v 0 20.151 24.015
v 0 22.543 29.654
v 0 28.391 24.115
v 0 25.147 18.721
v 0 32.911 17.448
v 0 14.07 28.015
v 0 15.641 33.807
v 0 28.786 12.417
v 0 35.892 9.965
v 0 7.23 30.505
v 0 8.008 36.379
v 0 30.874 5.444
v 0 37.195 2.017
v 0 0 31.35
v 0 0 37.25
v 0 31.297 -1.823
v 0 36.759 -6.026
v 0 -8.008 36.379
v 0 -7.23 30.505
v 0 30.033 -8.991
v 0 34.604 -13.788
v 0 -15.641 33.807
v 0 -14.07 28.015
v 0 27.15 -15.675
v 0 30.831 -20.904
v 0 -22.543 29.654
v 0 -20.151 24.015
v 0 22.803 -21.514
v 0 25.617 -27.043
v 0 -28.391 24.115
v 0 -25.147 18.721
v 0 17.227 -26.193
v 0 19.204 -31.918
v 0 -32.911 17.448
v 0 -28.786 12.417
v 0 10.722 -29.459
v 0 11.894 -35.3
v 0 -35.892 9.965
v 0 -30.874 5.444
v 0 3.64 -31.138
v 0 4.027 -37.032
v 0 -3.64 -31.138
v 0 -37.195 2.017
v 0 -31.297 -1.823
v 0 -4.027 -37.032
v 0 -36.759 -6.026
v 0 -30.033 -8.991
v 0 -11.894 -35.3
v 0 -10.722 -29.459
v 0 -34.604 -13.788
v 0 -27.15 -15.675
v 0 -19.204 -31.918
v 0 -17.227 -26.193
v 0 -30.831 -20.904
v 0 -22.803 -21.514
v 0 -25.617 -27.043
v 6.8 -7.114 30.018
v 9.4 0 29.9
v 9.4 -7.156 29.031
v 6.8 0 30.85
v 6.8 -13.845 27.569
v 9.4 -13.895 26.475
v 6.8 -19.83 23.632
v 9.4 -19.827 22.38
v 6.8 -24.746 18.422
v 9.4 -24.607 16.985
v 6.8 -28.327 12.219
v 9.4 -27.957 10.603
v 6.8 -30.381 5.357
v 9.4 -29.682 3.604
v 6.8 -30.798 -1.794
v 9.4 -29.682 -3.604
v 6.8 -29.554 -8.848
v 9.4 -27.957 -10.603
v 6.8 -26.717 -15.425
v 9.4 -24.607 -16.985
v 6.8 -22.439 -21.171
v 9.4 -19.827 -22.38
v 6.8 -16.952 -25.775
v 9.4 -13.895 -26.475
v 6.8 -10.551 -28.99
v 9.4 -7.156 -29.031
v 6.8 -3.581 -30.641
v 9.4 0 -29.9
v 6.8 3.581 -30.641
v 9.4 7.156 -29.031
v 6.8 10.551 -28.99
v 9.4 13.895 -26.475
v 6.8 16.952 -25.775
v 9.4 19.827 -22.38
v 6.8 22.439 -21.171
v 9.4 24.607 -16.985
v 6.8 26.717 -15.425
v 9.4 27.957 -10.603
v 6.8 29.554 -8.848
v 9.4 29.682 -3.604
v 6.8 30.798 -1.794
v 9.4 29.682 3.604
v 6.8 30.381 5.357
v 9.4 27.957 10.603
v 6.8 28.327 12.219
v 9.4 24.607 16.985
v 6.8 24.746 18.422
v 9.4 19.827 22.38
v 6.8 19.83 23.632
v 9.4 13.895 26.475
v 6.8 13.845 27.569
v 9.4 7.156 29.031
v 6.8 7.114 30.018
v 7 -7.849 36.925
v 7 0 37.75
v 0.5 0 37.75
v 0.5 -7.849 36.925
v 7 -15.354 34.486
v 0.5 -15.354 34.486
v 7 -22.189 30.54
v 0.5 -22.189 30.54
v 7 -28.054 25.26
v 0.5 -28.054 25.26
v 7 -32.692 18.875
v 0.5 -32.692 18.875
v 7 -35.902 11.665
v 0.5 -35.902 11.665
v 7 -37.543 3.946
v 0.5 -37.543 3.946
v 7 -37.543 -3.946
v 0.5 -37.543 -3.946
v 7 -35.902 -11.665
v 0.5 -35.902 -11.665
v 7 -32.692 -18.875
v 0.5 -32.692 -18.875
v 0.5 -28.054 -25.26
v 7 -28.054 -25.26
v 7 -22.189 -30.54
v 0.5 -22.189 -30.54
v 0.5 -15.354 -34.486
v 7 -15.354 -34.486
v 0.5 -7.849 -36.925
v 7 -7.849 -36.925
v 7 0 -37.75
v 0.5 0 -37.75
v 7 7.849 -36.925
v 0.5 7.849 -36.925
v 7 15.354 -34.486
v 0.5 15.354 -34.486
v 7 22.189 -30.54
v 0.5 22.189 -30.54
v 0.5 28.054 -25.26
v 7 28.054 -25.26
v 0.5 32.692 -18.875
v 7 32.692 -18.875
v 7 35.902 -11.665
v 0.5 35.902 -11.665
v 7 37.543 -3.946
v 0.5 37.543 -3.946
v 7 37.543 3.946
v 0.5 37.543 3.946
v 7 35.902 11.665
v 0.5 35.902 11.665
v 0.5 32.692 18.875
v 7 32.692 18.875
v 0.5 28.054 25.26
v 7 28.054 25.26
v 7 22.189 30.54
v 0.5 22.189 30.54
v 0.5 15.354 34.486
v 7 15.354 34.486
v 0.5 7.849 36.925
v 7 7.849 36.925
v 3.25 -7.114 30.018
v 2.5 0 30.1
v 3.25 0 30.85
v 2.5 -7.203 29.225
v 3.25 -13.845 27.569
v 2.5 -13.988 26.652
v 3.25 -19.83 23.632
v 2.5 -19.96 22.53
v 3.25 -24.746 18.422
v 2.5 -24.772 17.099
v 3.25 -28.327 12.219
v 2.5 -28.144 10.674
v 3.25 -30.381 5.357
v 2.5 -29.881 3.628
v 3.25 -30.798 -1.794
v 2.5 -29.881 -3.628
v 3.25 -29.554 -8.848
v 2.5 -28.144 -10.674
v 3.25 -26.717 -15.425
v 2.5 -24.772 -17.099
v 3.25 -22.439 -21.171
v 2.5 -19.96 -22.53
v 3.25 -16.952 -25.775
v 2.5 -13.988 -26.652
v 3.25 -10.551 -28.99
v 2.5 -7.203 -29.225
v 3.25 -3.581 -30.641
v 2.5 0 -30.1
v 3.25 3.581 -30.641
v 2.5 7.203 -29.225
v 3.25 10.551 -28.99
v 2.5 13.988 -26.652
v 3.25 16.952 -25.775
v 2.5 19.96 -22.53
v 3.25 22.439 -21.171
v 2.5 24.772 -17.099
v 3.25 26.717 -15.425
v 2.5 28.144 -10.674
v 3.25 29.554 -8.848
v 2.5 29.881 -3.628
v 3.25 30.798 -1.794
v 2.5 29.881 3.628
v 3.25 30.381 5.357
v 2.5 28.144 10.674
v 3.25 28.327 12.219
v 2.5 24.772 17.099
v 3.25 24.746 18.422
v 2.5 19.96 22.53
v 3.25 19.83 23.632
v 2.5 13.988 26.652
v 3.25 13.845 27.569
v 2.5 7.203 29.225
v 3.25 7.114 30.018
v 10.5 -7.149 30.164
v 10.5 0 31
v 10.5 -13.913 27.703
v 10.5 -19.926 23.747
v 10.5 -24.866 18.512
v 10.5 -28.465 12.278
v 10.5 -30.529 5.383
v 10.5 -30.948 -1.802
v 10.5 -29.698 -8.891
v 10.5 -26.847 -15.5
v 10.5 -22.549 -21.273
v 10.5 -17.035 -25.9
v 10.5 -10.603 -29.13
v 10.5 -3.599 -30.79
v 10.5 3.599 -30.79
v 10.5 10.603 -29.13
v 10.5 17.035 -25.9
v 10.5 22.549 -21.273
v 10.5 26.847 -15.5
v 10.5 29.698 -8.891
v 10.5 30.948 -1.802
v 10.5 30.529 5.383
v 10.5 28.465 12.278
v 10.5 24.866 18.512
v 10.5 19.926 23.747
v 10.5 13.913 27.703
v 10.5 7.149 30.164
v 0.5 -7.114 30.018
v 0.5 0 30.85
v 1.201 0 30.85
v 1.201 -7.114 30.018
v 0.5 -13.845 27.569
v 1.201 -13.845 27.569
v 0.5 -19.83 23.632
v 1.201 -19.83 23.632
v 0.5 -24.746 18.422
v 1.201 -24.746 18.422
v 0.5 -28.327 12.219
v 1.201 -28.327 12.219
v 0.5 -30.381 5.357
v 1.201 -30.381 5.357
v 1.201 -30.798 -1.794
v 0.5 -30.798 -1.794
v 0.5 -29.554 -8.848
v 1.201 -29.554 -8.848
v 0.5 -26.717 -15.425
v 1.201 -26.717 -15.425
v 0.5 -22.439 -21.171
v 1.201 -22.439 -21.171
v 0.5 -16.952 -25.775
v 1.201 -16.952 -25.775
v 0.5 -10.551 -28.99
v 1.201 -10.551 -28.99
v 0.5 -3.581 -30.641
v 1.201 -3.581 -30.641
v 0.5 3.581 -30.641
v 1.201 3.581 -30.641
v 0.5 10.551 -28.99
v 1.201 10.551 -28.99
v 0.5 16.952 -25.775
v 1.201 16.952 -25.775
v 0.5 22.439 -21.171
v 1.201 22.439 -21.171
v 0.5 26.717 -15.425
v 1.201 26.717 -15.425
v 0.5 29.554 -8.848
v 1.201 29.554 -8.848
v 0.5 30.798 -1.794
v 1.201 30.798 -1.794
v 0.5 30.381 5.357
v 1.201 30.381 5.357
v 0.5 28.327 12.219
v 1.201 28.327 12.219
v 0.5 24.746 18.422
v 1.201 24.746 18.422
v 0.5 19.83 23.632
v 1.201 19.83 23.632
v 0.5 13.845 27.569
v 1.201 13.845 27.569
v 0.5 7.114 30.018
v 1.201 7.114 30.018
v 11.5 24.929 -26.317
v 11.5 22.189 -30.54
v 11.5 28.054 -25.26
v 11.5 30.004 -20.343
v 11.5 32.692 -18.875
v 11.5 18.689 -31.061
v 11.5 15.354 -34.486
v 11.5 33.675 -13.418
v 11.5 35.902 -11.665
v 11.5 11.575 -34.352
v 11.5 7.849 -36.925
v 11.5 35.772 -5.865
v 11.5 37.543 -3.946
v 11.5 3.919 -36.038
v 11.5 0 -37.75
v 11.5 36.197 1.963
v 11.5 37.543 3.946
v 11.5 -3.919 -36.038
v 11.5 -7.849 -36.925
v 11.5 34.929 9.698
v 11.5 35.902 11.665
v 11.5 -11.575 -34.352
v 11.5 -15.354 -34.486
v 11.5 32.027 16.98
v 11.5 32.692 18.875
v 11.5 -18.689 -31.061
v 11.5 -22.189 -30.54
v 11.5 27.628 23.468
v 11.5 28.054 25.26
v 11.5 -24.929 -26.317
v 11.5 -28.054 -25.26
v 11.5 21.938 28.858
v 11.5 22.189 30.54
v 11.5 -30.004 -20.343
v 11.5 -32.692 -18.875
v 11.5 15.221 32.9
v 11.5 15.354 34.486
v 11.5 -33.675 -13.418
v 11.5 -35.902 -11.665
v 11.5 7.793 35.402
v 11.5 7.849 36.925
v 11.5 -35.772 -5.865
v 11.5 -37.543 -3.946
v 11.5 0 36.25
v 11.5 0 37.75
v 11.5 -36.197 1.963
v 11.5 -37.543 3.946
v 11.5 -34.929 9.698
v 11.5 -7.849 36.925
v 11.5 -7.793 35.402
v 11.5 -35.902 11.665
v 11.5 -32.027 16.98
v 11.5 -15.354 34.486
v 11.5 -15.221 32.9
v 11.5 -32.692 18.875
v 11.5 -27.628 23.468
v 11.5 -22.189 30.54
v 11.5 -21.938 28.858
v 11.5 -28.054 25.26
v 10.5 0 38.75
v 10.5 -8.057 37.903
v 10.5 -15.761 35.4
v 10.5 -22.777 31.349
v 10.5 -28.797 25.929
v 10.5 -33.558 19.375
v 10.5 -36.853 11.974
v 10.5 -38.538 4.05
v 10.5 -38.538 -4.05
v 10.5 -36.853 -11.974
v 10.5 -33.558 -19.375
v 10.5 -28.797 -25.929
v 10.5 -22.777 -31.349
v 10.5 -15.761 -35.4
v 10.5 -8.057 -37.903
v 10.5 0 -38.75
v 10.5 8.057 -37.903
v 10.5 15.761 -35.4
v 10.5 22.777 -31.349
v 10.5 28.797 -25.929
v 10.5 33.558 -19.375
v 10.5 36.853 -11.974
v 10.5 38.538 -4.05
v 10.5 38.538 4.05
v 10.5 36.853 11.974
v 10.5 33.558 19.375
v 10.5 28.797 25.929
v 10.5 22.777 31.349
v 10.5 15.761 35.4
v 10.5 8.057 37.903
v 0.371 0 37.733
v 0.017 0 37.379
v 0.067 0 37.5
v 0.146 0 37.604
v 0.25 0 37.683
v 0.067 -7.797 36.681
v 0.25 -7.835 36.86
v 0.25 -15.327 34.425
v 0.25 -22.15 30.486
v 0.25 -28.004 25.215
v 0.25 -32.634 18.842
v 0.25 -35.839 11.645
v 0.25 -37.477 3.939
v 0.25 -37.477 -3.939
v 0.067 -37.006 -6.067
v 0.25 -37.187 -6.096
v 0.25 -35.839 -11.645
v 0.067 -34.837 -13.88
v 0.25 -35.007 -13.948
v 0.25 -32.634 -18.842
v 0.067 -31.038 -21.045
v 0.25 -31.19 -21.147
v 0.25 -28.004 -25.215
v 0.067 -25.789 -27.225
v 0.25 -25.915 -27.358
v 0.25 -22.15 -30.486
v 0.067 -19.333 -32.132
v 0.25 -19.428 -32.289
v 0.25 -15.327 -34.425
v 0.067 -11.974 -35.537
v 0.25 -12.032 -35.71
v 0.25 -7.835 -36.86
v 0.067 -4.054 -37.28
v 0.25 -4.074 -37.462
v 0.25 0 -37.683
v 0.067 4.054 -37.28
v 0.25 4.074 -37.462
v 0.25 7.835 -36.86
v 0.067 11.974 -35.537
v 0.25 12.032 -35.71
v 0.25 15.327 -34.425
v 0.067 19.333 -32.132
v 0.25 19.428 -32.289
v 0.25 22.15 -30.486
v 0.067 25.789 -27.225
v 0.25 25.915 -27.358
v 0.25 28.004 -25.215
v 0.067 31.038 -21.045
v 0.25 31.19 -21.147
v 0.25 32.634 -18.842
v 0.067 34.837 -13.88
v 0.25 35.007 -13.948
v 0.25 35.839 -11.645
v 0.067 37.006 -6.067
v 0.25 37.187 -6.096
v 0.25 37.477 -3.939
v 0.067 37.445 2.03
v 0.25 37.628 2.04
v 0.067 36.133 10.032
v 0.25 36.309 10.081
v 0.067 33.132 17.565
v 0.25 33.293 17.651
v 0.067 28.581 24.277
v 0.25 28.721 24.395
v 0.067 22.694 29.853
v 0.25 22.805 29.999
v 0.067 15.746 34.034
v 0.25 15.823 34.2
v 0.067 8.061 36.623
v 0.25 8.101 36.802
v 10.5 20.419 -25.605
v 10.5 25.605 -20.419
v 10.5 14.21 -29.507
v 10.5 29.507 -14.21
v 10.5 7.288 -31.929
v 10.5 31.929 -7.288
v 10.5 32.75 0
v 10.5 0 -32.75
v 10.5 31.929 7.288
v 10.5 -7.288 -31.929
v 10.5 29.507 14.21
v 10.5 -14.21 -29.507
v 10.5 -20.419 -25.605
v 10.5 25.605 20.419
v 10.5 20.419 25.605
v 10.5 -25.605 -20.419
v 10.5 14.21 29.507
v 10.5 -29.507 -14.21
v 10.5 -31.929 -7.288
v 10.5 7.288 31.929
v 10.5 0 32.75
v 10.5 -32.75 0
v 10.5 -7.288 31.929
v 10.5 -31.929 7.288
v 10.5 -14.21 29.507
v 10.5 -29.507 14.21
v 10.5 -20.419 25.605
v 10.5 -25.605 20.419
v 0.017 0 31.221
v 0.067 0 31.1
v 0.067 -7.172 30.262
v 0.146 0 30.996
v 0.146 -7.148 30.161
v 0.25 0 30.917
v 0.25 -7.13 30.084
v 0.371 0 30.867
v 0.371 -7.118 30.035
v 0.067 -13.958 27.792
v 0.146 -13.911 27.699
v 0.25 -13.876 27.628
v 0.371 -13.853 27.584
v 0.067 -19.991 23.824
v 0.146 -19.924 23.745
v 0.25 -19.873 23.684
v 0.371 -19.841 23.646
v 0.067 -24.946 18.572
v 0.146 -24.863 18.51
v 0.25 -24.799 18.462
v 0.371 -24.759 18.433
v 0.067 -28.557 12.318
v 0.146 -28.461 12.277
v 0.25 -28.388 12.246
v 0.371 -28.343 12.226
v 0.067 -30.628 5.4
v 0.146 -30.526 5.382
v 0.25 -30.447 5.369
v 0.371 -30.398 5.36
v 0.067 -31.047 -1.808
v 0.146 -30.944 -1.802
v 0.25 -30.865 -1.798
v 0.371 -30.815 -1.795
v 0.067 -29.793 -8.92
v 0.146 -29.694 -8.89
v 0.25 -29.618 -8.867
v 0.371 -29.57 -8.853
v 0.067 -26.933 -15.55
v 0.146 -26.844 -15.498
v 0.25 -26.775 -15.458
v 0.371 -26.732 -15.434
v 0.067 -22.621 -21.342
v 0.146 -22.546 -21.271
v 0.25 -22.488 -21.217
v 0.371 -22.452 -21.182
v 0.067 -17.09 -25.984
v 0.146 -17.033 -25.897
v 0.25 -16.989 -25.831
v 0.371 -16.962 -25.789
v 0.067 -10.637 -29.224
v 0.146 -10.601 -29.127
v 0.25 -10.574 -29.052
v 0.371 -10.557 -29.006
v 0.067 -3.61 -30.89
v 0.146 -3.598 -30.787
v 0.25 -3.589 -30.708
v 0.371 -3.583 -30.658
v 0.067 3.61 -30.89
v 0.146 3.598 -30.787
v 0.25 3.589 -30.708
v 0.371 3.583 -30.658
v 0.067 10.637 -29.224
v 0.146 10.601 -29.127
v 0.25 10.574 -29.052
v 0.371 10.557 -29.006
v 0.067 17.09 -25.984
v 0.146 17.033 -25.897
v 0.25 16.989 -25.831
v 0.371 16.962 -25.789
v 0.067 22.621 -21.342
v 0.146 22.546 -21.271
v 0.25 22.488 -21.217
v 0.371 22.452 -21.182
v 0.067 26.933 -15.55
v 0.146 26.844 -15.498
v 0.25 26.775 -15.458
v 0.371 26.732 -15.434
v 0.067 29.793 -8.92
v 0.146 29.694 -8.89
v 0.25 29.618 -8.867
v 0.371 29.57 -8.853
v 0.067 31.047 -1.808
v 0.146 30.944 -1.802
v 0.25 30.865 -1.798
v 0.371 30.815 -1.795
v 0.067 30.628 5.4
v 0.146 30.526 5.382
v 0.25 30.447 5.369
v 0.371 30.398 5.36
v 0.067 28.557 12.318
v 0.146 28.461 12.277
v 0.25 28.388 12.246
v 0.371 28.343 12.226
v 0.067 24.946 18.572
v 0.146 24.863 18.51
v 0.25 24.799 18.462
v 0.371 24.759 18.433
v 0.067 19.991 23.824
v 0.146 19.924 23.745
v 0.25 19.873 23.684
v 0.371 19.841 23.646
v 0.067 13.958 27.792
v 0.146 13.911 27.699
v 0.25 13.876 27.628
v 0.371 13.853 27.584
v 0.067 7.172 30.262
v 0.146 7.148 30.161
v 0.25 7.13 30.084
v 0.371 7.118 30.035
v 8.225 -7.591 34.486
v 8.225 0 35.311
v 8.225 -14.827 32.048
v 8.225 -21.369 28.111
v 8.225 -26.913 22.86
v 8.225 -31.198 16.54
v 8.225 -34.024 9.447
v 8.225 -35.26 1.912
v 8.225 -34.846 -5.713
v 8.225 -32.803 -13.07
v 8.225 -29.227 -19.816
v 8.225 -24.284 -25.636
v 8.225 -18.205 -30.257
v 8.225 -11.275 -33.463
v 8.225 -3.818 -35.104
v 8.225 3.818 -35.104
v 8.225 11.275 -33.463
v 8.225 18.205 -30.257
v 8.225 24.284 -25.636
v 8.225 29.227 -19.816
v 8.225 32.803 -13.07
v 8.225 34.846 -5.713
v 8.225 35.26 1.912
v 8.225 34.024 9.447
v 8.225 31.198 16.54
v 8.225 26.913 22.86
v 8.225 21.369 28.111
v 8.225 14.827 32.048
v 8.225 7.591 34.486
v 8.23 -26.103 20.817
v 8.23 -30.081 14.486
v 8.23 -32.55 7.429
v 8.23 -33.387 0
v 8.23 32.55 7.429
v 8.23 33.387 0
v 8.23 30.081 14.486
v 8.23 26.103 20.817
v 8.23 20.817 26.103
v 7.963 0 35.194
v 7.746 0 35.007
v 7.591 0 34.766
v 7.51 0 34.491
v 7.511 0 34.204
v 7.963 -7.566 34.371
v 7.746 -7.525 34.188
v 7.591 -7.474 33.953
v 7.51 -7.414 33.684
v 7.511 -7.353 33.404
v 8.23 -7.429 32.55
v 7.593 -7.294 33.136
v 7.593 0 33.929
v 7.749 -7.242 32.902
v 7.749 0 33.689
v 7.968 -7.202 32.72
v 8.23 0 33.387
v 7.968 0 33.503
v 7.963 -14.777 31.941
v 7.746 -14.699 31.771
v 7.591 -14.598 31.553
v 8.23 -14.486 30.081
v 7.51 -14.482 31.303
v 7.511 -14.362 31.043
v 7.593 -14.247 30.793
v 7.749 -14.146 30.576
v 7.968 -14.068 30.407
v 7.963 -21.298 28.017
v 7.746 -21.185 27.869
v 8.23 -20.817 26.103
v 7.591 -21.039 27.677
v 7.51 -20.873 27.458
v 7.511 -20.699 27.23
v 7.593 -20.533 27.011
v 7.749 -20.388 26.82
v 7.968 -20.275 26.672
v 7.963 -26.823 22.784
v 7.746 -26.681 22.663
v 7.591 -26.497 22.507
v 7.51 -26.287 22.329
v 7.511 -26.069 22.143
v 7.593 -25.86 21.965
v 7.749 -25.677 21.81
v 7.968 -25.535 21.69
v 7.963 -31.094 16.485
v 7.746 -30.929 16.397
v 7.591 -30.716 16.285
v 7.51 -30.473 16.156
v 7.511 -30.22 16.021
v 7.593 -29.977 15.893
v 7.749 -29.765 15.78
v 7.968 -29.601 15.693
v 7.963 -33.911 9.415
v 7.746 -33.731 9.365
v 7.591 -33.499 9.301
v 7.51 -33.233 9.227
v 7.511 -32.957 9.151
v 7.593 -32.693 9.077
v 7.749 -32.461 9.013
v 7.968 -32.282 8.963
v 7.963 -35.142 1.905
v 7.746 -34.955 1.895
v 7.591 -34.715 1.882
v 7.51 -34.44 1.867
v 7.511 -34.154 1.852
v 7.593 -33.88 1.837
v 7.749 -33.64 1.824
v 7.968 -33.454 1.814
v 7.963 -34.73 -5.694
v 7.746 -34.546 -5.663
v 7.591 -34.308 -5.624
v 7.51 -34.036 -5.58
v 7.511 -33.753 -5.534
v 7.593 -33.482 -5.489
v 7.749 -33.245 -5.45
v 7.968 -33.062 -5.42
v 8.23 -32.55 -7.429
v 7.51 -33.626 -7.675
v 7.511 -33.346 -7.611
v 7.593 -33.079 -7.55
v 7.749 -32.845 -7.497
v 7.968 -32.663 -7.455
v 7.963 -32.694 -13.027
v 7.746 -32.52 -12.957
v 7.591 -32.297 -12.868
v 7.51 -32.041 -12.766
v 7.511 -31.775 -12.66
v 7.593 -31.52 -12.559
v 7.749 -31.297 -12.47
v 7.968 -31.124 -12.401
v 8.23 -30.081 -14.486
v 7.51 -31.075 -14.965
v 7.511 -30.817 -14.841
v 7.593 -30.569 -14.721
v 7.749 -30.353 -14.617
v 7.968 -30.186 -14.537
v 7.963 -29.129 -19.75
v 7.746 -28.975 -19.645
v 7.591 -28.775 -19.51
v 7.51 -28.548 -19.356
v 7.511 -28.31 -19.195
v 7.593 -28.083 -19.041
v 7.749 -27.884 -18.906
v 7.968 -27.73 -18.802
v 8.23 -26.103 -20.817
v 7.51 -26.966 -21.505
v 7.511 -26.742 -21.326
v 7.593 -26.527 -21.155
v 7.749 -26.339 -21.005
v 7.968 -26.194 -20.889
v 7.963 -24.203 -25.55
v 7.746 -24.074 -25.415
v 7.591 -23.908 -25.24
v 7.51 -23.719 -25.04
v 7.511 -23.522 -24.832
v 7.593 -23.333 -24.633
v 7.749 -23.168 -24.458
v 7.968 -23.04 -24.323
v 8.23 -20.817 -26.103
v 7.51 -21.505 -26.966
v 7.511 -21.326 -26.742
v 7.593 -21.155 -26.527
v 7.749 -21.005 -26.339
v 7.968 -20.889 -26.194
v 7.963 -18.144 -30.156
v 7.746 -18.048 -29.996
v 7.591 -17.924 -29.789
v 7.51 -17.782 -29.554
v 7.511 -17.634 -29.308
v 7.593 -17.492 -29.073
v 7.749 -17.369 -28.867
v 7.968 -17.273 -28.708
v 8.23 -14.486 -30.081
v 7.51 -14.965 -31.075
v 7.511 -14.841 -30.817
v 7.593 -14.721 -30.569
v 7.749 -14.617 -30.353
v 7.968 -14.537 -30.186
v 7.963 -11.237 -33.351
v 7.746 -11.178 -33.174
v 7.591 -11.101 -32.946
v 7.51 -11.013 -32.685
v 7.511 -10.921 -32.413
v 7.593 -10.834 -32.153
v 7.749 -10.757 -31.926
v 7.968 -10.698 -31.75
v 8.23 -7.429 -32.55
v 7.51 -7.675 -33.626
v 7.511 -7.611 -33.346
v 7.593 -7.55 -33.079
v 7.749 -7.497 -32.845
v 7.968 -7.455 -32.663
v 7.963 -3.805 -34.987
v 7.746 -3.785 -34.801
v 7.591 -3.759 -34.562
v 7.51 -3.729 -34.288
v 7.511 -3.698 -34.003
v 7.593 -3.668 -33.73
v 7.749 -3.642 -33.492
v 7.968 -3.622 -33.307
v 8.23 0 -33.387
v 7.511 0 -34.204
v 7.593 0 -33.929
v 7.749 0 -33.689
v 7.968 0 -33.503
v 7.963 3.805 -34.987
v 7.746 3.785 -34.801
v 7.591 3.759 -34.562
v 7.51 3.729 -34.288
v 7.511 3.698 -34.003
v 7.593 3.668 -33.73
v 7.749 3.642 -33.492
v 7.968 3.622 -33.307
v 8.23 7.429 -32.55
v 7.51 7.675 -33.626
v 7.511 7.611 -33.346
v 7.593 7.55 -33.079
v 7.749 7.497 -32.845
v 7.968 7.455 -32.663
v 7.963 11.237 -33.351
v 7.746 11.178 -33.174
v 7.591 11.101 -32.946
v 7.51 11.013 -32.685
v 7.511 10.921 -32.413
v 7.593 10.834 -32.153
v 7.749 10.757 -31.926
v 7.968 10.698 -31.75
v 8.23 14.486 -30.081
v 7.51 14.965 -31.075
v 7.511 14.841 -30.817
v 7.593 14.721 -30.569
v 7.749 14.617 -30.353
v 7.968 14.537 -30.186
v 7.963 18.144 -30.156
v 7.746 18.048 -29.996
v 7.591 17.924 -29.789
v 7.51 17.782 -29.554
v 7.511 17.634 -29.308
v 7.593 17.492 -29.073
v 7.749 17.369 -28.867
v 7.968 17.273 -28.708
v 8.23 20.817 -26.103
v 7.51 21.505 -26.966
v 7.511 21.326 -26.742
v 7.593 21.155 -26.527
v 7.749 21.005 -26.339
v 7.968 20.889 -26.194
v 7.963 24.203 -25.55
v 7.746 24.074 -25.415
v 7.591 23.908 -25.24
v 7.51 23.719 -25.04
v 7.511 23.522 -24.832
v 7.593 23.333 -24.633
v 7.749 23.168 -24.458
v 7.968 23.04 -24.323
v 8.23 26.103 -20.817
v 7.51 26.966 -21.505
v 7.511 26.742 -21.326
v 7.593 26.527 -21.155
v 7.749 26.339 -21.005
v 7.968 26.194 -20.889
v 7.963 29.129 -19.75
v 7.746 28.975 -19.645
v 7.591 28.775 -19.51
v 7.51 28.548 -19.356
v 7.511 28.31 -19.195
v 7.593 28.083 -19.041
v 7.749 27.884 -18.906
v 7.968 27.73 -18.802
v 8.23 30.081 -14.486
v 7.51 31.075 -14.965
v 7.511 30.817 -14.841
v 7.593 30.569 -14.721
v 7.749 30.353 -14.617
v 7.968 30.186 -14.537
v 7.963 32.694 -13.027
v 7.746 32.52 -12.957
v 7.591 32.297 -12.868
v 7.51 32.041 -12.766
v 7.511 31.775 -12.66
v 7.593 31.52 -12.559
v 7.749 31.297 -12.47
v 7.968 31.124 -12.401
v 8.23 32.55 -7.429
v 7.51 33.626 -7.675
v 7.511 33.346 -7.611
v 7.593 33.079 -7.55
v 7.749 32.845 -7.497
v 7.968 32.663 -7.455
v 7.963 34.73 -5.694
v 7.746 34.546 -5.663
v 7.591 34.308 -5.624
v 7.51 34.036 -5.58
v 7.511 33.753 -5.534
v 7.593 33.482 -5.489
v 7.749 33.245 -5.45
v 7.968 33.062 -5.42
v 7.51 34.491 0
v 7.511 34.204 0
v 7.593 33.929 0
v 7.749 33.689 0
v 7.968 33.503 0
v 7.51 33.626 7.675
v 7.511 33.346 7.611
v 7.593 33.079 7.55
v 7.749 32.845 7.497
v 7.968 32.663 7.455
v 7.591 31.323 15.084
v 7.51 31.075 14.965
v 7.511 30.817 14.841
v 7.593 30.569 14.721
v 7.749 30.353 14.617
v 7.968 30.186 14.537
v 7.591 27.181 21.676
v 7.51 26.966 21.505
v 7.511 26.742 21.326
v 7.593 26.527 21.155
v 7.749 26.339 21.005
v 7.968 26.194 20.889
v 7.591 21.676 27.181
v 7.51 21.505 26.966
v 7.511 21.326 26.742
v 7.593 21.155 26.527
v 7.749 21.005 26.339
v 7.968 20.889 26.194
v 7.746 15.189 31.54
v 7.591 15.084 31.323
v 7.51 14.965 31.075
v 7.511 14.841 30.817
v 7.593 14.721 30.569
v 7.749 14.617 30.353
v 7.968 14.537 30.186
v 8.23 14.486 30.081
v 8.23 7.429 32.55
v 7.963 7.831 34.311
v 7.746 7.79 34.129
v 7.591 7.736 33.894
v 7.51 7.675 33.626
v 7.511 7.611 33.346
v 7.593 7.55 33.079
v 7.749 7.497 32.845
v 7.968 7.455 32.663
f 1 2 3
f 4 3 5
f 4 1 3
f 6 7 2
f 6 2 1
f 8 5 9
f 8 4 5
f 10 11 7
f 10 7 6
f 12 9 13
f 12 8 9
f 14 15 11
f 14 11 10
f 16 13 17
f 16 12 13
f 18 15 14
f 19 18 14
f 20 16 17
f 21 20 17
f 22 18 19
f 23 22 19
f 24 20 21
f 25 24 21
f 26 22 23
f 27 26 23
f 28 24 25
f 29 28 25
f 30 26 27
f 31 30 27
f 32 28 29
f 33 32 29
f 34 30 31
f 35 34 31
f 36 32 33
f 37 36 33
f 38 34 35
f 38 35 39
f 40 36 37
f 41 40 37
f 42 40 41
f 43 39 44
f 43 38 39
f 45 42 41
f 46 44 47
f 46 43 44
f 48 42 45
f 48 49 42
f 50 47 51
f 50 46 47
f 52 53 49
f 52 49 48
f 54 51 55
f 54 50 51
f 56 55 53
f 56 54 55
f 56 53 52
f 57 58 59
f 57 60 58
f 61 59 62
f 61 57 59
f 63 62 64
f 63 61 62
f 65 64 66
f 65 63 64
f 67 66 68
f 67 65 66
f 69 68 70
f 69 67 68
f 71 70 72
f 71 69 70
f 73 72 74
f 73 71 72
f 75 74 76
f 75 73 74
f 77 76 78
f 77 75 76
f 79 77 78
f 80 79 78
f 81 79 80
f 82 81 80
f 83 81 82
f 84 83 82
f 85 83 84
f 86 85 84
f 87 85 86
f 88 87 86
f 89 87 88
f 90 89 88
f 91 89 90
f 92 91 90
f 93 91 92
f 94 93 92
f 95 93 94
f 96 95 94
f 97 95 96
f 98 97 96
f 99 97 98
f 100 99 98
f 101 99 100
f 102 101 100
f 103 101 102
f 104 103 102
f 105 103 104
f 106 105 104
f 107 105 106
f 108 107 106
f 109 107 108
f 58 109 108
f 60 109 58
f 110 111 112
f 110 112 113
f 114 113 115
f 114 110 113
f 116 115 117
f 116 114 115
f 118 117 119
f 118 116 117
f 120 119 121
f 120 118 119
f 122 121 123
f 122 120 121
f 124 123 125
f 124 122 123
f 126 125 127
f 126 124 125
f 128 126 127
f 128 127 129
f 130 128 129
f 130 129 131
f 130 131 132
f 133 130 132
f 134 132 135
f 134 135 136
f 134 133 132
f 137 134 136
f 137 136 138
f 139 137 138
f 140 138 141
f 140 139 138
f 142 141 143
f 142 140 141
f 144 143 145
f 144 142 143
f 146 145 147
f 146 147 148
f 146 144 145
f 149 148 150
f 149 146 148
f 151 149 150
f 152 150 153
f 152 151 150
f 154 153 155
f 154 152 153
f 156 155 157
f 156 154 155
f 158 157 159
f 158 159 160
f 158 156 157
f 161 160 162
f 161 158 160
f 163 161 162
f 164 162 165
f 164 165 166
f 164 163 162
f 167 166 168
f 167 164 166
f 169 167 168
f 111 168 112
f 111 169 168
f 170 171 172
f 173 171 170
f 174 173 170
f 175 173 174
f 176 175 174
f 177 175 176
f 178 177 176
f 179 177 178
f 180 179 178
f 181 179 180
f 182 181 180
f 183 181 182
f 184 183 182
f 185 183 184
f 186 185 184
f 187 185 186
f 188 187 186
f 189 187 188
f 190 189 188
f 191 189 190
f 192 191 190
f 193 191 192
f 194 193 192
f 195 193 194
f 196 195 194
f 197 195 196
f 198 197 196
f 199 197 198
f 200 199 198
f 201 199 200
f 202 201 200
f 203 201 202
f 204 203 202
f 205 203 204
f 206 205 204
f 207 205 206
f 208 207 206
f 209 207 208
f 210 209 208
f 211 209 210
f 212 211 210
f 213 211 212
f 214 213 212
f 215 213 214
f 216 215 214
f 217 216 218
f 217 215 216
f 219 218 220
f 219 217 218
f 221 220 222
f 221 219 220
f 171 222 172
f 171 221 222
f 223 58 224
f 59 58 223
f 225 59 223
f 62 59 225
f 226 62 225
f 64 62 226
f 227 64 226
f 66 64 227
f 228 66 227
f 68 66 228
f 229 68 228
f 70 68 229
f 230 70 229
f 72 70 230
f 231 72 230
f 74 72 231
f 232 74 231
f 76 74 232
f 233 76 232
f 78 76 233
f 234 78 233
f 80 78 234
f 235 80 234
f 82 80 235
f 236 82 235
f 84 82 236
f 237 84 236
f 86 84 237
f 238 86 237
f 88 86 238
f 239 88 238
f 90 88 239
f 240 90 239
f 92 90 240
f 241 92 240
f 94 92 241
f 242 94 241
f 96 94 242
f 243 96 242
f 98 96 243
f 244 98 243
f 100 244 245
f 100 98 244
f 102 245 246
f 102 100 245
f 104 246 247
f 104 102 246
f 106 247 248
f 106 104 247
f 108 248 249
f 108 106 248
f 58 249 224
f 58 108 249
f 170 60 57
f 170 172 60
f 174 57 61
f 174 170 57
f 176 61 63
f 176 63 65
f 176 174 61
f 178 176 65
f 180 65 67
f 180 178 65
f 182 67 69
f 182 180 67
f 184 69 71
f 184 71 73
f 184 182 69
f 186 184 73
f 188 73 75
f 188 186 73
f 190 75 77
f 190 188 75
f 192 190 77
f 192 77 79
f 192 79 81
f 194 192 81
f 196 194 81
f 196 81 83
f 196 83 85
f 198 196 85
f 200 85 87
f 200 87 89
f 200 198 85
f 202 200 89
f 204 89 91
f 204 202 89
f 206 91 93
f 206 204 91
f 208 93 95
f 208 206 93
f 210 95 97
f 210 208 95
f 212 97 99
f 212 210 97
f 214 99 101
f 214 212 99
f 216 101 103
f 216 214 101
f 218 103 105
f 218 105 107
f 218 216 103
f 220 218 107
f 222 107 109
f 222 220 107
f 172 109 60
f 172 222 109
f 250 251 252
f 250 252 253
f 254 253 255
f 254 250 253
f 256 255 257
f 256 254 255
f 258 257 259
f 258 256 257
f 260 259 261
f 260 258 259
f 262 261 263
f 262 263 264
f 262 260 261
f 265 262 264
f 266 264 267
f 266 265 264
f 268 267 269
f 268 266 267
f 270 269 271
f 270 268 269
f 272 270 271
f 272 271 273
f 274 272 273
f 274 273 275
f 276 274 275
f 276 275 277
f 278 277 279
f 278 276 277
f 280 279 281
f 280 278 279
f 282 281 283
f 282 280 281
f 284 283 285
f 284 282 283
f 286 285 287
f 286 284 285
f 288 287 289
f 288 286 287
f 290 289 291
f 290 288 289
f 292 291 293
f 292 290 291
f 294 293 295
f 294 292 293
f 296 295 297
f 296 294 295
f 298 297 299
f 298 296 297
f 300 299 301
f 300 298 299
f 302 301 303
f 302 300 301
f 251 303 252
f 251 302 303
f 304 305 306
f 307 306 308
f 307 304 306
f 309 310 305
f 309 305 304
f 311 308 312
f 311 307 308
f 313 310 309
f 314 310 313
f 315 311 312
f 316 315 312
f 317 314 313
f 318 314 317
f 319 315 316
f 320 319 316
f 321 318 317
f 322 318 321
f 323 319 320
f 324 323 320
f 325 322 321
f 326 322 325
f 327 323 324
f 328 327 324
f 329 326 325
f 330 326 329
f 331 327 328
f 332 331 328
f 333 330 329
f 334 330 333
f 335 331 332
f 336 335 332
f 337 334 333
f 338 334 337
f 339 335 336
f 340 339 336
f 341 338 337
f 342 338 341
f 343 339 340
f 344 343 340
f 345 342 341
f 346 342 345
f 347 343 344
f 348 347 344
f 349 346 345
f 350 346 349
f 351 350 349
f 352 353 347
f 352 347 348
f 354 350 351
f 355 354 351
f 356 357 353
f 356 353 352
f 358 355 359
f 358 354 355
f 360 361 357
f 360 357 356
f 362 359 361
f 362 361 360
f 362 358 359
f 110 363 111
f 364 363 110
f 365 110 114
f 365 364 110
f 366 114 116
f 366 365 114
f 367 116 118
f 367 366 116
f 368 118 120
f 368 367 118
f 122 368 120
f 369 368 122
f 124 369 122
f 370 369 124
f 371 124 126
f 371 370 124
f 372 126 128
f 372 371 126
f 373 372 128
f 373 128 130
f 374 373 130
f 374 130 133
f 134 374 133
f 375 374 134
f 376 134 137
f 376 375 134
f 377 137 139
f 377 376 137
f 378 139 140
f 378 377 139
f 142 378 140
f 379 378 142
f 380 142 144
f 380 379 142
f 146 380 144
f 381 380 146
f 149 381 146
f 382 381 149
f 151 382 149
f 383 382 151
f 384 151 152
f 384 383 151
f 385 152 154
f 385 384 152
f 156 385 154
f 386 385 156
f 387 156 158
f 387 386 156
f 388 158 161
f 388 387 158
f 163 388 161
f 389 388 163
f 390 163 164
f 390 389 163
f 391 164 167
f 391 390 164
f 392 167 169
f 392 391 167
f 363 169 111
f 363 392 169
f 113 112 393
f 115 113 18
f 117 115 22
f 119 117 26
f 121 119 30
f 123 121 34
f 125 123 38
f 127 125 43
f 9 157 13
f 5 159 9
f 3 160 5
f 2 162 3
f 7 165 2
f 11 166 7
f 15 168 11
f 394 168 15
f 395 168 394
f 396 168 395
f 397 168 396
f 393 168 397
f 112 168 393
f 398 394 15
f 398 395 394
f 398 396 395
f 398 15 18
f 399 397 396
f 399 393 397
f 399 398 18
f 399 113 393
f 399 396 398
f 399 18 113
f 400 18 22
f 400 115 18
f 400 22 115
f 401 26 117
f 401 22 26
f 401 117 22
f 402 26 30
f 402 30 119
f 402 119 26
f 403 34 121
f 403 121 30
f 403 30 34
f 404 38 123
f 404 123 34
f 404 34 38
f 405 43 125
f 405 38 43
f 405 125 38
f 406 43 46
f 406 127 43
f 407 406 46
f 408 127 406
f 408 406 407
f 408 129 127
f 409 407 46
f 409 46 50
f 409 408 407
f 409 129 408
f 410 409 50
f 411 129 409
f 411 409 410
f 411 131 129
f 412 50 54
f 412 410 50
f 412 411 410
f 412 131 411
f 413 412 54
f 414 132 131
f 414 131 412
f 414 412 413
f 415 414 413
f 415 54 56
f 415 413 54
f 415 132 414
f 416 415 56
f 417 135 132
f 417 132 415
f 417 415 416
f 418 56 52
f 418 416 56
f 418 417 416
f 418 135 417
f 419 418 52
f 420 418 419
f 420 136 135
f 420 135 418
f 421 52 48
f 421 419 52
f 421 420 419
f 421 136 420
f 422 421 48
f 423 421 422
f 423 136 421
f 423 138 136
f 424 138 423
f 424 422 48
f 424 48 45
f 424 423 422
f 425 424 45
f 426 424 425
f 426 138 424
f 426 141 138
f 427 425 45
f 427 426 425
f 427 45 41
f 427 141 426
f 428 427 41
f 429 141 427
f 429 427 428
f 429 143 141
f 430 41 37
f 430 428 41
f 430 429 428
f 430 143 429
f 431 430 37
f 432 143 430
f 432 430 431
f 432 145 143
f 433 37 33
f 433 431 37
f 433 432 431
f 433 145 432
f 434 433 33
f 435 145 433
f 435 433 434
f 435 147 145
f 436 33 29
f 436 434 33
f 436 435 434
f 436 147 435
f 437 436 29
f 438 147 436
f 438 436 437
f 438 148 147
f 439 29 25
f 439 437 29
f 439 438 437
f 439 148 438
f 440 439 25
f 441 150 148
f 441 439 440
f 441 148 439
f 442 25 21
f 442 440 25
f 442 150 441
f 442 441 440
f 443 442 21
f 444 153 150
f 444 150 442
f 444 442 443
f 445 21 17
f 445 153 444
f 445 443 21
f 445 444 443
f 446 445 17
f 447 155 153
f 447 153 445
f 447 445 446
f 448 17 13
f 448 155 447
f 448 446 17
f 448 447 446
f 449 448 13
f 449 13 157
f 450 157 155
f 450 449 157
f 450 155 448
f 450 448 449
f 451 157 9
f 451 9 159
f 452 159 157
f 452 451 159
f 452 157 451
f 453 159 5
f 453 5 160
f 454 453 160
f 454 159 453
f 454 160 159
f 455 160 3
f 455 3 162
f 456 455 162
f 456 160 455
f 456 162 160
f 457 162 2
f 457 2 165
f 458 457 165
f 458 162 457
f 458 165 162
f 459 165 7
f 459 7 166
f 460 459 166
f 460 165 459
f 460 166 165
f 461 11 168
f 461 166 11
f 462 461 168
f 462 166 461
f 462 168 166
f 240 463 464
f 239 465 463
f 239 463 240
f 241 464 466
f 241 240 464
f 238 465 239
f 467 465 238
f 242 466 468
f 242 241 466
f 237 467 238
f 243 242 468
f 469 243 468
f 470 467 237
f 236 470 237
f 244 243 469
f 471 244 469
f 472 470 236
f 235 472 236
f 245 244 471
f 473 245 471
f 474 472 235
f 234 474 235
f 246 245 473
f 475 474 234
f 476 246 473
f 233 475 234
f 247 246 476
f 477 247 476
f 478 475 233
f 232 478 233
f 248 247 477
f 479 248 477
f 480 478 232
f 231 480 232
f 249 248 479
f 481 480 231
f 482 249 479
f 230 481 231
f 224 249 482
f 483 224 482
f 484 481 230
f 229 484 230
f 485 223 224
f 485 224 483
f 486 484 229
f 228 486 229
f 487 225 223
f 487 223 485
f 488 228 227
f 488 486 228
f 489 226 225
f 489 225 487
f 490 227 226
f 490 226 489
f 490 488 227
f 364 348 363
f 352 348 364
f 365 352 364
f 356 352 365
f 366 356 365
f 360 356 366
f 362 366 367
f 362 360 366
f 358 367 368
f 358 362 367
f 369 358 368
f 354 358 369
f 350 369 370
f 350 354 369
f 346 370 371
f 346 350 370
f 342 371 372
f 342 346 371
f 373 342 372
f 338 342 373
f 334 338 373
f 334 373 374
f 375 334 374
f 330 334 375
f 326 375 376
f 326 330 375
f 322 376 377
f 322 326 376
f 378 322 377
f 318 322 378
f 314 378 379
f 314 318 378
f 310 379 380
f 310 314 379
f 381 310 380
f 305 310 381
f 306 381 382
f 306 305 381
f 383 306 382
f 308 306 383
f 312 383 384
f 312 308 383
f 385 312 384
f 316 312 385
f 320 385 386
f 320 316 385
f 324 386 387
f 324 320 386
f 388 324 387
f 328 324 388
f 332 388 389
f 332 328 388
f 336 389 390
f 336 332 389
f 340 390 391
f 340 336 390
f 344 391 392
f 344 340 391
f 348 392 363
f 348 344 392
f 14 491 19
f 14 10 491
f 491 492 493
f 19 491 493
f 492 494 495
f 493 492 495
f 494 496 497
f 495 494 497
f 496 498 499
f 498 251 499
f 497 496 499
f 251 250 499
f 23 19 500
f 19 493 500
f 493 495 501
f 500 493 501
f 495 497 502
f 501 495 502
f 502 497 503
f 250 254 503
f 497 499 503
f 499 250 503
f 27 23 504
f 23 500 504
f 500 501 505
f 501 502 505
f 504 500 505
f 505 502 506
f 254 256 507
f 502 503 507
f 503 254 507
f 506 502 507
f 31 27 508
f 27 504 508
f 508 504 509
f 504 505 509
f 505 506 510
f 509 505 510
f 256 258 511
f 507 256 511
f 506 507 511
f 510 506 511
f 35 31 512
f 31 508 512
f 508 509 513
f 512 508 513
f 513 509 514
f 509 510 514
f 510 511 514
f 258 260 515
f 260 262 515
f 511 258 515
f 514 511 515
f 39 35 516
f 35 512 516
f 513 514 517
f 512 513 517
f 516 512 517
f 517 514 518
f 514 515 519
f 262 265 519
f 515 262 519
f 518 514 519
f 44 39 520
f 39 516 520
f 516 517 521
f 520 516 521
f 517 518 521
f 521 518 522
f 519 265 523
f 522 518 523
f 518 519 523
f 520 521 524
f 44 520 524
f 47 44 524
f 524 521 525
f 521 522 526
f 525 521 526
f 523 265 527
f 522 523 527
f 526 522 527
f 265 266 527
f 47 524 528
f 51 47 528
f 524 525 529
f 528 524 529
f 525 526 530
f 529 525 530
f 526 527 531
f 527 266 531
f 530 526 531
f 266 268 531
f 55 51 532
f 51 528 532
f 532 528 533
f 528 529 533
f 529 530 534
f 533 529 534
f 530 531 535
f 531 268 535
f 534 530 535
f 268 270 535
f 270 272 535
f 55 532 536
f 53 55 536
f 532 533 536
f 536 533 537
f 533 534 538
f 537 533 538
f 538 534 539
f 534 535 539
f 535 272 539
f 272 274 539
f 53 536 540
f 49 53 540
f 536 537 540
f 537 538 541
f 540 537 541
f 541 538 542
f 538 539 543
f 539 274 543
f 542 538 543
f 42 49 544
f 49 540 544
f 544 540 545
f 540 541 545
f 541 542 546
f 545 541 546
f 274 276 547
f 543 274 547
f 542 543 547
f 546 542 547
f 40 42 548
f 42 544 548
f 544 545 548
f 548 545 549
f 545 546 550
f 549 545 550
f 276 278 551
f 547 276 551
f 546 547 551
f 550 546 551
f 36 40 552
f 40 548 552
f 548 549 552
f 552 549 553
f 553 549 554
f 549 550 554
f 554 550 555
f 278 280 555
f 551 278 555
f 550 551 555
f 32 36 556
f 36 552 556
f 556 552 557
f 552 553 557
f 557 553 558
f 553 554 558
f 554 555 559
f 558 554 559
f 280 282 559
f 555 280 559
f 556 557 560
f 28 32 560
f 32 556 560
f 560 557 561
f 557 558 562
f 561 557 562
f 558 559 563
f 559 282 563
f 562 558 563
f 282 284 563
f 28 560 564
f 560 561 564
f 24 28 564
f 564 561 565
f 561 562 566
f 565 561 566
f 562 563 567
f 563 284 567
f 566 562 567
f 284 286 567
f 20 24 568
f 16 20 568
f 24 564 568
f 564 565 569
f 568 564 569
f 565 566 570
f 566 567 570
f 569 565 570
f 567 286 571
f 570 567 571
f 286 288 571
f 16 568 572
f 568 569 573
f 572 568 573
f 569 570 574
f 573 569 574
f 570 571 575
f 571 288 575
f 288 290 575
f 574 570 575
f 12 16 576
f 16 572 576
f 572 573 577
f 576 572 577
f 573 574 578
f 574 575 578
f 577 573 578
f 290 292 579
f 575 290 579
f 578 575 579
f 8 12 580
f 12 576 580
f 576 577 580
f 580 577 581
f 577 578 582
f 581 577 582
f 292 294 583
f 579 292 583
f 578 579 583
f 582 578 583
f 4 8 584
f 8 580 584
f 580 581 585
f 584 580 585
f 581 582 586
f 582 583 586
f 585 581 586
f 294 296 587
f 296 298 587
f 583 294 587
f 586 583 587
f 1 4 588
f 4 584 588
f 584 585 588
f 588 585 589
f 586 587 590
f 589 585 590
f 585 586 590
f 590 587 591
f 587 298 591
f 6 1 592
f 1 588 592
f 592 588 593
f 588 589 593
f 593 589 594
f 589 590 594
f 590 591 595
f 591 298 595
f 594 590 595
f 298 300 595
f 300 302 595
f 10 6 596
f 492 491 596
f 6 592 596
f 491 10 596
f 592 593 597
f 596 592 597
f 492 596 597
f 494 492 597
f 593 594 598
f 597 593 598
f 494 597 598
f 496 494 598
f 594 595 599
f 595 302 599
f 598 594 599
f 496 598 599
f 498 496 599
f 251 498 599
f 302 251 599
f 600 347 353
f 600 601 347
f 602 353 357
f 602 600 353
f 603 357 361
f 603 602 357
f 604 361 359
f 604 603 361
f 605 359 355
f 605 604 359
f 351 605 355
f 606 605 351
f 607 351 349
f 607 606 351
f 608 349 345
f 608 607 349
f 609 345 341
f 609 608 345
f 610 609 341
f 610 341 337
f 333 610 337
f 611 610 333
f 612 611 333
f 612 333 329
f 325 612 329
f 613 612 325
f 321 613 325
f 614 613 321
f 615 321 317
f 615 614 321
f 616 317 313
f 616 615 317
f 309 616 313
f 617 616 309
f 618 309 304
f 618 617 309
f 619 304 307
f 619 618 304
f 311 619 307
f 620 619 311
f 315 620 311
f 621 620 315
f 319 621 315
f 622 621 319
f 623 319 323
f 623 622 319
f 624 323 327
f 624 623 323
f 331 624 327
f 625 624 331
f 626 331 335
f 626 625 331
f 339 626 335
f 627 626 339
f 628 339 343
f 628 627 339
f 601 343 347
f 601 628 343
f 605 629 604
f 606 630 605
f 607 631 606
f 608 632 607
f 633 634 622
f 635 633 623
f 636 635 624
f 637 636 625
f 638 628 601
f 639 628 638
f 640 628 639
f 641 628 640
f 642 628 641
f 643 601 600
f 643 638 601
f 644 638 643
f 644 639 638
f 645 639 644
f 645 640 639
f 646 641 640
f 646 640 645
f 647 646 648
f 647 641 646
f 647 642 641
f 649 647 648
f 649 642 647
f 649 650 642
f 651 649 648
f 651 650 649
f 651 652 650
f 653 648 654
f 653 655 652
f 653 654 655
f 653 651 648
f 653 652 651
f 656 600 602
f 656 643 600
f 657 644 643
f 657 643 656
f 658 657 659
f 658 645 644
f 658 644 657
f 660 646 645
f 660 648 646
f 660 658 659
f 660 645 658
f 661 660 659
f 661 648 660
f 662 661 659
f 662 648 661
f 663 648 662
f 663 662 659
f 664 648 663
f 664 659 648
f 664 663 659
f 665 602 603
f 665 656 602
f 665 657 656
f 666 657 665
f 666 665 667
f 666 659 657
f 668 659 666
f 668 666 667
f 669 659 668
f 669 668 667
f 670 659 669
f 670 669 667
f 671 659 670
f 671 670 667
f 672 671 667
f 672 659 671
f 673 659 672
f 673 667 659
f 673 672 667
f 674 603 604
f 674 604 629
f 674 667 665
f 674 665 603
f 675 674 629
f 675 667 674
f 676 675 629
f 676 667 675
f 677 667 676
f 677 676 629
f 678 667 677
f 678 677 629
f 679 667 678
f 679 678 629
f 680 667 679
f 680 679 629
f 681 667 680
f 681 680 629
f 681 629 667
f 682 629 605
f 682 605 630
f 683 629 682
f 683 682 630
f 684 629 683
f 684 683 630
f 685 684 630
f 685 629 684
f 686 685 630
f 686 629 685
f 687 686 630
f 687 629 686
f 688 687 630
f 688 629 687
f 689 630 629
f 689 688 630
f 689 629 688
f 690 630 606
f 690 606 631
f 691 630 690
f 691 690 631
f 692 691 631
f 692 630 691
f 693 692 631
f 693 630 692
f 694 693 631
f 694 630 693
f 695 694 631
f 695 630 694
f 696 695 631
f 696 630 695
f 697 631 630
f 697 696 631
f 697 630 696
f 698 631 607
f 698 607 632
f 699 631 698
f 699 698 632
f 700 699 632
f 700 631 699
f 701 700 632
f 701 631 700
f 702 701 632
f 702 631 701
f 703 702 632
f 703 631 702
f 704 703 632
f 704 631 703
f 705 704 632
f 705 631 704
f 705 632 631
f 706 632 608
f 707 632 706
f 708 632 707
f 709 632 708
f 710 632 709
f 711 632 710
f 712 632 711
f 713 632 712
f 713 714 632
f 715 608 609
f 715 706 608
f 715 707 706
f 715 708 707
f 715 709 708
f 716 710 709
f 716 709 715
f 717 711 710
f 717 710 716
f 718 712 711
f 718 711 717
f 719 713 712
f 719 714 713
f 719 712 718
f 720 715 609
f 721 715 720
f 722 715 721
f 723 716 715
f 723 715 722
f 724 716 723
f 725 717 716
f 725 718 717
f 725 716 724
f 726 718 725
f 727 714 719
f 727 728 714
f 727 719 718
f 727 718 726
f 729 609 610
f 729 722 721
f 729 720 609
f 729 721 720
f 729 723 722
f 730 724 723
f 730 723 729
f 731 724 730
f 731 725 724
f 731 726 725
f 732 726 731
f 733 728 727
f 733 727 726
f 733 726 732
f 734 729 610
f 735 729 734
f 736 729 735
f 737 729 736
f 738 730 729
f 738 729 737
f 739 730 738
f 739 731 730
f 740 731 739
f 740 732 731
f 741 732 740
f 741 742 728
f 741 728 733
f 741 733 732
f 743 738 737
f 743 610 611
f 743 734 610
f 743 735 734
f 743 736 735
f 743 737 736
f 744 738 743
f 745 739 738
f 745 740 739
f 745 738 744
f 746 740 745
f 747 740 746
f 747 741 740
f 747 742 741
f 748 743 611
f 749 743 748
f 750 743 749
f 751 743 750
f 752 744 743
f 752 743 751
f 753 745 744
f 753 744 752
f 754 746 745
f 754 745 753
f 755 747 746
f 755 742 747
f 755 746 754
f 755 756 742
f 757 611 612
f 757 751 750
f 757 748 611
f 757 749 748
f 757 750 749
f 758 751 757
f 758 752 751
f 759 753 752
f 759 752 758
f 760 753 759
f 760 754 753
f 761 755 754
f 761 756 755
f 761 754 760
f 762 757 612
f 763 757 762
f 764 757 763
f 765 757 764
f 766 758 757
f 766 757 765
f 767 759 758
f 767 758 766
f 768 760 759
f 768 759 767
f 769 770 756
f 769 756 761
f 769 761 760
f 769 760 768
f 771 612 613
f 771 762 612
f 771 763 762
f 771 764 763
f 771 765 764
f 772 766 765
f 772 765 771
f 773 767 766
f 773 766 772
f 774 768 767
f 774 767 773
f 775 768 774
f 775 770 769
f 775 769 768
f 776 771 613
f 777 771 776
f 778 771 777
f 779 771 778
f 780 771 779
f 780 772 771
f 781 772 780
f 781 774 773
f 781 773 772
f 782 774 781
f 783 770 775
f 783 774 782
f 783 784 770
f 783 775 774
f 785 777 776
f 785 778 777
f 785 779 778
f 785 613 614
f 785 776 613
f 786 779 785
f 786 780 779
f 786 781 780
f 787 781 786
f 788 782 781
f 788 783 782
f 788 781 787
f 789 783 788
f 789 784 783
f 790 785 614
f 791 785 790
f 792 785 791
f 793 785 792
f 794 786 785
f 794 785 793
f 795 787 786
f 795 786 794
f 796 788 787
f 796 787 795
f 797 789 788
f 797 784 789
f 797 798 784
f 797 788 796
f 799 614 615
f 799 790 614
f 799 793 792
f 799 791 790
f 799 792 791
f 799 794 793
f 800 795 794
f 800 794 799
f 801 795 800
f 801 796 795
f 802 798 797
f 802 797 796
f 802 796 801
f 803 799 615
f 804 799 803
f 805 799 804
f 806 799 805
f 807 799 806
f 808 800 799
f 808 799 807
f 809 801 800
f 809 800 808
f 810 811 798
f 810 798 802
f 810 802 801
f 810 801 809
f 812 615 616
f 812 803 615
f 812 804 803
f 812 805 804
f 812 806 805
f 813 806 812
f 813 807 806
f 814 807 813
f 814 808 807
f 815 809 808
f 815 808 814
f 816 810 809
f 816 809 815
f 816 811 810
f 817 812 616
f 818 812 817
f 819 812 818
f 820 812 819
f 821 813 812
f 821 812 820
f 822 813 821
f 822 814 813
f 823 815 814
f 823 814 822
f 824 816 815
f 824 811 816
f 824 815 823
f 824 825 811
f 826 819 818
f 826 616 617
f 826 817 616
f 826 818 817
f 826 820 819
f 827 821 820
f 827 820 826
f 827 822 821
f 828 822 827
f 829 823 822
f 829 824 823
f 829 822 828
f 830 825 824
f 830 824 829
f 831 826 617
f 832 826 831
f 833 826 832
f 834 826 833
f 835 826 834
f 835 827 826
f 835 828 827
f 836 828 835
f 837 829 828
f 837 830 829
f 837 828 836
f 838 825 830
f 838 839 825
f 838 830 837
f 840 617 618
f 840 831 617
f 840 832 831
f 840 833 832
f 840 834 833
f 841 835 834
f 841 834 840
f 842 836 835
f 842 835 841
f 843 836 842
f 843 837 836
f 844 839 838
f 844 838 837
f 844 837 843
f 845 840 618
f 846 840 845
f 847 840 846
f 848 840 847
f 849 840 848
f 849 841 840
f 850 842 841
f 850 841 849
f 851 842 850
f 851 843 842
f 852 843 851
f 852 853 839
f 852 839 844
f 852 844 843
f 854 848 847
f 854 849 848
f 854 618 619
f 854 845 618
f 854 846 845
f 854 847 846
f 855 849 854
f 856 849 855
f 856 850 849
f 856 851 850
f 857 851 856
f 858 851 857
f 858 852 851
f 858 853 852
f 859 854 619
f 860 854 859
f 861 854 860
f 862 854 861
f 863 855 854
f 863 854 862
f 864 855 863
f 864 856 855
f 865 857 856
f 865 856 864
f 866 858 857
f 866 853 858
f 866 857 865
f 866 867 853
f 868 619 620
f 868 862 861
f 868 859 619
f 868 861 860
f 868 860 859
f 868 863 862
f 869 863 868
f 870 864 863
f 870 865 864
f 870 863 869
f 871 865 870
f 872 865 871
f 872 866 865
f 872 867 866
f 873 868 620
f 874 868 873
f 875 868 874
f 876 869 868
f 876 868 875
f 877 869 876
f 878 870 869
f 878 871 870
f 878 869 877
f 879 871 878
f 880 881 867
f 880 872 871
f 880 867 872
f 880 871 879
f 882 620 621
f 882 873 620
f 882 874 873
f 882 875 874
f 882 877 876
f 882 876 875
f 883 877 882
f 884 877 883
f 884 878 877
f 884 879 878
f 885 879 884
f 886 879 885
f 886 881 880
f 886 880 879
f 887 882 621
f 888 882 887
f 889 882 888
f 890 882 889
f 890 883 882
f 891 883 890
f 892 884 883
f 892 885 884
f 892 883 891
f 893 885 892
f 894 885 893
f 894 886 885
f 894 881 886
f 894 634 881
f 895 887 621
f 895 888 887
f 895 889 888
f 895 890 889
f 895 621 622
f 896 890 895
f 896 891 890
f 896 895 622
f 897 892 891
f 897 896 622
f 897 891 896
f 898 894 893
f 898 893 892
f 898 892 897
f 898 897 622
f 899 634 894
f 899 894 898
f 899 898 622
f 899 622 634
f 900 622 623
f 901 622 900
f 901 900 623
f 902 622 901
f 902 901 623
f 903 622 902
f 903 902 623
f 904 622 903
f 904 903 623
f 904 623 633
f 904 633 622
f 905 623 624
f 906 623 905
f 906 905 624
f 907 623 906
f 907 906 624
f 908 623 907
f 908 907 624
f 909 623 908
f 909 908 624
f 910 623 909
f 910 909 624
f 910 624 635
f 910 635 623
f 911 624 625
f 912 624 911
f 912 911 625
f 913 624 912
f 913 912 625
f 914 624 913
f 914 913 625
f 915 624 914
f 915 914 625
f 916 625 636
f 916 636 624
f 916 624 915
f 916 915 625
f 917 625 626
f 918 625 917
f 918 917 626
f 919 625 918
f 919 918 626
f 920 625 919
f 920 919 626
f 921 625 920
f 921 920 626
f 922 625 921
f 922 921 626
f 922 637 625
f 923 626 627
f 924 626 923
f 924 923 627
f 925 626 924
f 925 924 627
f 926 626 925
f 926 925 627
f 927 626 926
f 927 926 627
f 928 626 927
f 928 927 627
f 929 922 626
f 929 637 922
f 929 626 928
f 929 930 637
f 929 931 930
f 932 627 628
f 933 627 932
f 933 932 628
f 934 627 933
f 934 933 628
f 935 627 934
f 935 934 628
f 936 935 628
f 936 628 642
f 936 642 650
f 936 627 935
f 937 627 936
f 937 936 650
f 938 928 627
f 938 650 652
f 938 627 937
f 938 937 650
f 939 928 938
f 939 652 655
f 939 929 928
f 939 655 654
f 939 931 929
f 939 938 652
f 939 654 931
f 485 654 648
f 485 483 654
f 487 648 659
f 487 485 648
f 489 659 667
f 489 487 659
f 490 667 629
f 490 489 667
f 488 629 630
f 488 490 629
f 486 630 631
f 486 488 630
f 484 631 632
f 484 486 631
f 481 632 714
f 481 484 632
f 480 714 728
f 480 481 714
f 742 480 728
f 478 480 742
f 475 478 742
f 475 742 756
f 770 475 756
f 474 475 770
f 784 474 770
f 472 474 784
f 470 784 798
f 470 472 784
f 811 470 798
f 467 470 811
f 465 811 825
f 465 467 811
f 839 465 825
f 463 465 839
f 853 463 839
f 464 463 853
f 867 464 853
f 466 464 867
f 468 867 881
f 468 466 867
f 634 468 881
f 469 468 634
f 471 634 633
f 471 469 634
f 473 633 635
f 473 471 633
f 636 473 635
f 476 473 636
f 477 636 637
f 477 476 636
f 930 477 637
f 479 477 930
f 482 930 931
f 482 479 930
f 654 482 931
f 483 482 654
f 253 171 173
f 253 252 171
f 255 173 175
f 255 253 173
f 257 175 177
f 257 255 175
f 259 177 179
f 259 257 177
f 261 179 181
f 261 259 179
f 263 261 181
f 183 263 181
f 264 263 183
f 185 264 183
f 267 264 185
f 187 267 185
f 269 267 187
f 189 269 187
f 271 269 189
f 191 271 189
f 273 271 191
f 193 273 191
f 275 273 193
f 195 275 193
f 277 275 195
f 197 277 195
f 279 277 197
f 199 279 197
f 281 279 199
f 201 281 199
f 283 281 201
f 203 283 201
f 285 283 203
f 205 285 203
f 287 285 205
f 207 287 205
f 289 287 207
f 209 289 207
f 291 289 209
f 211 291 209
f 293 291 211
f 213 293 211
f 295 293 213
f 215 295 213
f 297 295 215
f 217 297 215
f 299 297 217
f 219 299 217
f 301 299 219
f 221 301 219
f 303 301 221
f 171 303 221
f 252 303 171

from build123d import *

# Parameters (mm, degrees)
FILLET1_R = 0.5


with BuildPart() as part:
    # Sketch1 → Revolve1 (revolve)
    with BuildSketch(Plane.XY, mode=Mode.PRIVATE) as revolve1_sk:
        with BuildLine():
            Line((0, 30.85), (0, 37.75))
            Line((0, 37.75), (7, 37.75))
            Line((7, 37.75), (10.5, 38.75))
            Line((10.5, 38.75), (11.5, 37.75))
            Line((11.5, 37.75), (11.5, 36.25))
            Line((11.5, 36.25), (8.224507889, 35.311303332))
            ThreePointArc((8.224507889, 35.311303332), (7.500003732, 34.347267981), (8.229764579, 33.387205724))
            Line((8.229764579, 33.387205724), (10.5, 32.75))
            Line((10.5, 32.75), (10.5, 31))
            Line((10.5, 31), (9.4, 29.9))
            Line((9.4, 29.9), (6.8, 30.85))
            Line((6.8, 30.85), (3.25, 30.85))
            Line((3.25, 30.85), (2.5, 30.1))
            Line((2.5, 30.1), (1.200961894, 30.85))
            Line((1.200961894, 30.85), (0, 30.85))
        make_face()
    revolve(revolve1_sk.sketch.rotate(Axis((0, 0, 0), (1, 0, 0)), 90), axis=Axis((0, 0, 0), (1, 0, 0)))

    # Fillet1
    fillet1_edges = [part.edges().sort_by_distance(p)[0] for p in [
        (0, 0, -30.85),
        (0, 0, -37.75),
    ]]
    fillet(fillet1_edges, radius=FILLET1_R)


solid = part.part
